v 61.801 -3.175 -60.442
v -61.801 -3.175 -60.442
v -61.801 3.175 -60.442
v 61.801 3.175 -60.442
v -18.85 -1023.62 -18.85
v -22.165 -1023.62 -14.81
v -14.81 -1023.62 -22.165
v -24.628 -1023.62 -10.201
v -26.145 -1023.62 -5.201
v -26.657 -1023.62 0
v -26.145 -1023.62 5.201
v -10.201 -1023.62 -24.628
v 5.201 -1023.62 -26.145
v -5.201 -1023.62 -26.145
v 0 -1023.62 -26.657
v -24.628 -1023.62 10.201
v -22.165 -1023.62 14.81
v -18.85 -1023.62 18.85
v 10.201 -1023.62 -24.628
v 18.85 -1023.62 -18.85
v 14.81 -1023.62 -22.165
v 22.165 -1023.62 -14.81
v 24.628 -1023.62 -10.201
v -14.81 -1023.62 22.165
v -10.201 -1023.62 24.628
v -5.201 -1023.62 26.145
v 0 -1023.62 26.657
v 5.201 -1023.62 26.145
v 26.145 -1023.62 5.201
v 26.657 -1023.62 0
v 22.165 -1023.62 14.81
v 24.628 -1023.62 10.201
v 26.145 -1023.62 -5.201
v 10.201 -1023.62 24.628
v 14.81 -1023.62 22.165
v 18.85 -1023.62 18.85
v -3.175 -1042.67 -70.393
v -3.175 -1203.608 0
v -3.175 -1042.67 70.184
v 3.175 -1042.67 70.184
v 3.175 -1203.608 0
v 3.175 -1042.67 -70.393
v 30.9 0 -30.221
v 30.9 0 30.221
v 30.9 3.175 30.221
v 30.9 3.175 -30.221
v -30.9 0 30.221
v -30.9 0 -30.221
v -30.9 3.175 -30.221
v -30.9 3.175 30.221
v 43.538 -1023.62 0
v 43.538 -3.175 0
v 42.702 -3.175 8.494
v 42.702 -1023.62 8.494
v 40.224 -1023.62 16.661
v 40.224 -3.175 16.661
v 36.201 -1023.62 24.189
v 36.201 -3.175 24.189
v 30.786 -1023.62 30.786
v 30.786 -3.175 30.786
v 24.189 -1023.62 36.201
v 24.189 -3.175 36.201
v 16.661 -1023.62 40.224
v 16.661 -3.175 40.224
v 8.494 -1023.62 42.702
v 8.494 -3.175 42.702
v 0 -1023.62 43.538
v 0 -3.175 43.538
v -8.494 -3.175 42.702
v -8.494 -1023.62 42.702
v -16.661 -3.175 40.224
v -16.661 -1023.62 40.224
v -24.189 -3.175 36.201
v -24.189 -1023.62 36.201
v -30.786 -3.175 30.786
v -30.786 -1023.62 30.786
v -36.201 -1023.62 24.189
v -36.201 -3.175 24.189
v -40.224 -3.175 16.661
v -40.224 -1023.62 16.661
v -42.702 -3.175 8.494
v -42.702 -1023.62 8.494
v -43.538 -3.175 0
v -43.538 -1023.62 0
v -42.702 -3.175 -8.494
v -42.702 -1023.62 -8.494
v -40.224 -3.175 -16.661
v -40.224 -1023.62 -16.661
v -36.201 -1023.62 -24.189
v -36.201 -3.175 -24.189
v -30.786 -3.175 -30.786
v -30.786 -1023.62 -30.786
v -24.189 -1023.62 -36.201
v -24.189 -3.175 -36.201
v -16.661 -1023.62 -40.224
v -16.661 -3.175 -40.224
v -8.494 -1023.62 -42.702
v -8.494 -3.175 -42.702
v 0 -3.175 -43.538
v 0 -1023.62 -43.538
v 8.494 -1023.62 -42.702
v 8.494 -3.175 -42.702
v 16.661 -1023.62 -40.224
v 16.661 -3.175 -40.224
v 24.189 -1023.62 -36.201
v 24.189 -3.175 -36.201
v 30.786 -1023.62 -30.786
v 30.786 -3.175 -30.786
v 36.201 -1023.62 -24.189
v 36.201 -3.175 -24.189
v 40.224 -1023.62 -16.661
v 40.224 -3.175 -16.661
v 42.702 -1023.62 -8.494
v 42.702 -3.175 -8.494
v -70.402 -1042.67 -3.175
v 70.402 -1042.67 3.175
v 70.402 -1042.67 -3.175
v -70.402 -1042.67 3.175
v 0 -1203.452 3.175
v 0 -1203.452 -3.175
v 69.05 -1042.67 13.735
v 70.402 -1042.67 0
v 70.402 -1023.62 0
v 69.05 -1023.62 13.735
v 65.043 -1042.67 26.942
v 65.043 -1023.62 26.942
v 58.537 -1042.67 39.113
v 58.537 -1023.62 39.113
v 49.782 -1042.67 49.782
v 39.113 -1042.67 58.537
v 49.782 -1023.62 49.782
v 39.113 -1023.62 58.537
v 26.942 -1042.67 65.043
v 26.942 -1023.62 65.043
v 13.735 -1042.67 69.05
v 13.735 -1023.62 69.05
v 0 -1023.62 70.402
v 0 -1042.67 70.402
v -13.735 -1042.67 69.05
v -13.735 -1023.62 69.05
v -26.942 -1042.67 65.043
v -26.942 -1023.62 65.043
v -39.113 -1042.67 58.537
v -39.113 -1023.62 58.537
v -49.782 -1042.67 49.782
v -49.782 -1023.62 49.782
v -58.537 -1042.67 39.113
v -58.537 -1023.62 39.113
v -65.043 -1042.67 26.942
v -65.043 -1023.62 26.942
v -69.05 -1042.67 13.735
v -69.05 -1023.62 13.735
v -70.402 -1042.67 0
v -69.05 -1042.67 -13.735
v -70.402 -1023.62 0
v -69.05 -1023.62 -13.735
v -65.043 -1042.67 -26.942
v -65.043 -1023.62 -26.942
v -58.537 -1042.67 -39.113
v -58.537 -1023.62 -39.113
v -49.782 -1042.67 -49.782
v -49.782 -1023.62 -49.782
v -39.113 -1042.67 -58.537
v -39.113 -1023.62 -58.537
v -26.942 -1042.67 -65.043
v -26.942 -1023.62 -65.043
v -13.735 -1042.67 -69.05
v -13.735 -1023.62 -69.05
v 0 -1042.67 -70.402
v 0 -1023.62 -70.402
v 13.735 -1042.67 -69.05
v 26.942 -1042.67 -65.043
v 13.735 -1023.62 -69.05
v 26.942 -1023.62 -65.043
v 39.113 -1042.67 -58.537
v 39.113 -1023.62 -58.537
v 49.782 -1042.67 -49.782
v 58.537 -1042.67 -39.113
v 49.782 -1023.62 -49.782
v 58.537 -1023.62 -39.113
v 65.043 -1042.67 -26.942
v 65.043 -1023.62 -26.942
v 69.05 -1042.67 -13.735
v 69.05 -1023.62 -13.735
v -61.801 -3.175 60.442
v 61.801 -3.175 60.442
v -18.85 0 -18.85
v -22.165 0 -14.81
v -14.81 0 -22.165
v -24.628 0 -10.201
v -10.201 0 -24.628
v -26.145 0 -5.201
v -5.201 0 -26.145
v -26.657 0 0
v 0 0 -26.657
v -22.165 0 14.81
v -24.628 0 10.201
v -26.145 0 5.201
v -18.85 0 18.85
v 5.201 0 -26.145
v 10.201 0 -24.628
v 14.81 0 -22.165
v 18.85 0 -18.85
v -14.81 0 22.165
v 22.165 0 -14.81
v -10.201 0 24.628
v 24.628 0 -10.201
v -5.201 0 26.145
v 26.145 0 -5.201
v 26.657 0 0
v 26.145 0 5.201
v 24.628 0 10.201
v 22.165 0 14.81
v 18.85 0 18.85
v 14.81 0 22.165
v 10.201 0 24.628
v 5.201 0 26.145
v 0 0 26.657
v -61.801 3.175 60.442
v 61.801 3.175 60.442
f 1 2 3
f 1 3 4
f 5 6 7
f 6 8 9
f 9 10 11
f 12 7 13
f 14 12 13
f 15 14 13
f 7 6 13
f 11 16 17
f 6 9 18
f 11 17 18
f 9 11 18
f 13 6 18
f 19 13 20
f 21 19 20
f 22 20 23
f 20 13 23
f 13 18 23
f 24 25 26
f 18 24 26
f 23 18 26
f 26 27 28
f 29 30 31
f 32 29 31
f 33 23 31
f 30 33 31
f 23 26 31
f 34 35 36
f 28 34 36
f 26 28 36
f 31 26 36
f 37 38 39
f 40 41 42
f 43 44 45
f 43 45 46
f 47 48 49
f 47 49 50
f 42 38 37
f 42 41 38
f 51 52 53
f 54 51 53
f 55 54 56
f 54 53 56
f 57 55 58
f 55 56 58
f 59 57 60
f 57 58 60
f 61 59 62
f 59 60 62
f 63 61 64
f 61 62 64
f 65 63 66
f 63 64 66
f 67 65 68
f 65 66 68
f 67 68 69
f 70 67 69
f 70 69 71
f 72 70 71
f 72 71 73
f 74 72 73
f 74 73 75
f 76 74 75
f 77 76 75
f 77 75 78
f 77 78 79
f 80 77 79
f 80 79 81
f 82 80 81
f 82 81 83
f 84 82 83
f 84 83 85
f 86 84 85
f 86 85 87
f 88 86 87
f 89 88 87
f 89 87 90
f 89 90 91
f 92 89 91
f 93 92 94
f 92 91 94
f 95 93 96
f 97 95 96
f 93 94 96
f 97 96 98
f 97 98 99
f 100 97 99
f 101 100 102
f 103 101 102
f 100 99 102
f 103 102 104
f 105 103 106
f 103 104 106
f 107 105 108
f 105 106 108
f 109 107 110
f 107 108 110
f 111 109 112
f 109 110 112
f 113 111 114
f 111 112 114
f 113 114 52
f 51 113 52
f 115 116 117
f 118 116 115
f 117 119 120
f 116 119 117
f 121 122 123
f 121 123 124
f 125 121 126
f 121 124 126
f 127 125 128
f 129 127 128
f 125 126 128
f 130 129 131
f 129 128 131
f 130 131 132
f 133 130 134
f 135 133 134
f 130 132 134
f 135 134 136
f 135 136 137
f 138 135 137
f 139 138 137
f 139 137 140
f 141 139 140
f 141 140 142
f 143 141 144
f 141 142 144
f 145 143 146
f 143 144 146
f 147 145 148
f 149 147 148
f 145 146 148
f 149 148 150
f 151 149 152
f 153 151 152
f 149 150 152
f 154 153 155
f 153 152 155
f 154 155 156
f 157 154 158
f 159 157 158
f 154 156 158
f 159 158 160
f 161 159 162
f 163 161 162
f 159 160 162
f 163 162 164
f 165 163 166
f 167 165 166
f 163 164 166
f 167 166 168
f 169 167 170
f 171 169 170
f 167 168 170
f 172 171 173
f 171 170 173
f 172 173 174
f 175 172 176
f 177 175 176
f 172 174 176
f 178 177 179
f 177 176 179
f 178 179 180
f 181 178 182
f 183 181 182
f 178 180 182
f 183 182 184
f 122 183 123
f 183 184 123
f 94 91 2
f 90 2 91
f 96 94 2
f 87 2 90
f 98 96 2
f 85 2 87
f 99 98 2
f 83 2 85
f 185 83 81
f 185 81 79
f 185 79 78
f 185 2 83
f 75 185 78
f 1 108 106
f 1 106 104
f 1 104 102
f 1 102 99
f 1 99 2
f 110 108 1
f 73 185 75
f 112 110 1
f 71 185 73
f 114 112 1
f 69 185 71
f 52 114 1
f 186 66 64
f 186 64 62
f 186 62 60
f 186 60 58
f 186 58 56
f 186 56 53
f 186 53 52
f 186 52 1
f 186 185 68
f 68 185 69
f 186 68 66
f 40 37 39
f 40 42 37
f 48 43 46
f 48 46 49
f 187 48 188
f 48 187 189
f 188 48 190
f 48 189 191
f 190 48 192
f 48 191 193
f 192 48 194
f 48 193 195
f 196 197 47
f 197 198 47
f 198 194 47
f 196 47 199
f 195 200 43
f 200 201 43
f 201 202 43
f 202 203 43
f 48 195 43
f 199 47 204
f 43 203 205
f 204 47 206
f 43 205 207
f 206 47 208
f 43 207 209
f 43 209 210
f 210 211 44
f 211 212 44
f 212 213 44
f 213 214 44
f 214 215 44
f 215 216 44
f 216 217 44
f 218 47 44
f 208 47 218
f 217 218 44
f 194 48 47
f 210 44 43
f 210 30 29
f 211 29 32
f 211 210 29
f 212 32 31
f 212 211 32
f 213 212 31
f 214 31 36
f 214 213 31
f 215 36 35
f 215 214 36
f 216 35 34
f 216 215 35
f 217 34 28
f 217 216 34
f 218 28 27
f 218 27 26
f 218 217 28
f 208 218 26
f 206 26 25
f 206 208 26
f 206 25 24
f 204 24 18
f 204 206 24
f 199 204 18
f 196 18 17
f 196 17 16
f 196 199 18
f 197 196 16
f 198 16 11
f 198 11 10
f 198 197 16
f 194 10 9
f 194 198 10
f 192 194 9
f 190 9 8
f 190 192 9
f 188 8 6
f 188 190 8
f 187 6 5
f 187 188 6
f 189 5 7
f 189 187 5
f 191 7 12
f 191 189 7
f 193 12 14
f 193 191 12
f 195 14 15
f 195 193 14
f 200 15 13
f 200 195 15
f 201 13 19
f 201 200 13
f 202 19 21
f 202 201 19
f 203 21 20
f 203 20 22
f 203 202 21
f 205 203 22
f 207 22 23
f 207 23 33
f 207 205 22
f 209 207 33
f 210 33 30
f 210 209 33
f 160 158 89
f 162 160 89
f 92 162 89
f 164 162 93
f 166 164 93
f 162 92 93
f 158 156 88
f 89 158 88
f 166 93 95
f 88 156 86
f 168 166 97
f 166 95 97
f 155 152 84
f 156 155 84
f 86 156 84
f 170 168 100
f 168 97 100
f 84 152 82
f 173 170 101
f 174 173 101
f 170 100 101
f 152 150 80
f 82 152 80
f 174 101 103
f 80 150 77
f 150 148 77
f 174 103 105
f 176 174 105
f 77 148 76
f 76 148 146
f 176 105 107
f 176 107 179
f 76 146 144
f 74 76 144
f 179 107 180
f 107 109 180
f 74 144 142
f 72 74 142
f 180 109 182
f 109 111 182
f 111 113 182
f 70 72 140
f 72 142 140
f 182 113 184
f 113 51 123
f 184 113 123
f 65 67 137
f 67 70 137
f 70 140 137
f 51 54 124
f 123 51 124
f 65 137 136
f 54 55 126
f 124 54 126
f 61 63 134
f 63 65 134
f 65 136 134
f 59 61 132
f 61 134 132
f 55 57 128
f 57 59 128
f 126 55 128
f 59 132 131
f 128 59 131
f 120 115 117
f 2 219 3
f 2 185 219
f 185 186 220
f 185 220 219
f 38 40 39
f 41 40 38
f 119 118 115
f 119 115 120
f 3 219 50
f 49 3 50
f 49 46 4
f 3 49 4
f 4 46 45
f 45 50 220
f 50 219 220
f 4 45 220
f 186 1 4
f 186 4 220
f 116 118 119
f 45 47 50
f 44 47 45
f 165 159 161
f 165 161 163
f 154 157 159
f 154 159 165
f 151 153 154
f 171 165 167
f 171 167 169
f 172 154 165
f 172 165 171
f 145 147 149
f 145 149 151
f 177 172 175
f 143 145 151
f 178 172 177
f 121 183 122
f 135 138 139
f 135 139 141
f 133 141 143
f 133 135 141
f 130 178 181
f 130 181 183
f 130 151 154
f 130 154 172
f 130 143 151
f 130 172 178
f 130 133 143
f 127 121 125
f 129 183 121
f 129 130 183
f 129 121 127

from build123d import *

# Parameters (mm, degrees)
F0_R      = 43.538166
F0_R_2    = 26.657293
F1_DEPTH  = 1023.62
F3_R      = 70.40233
F4_DEPTH  = 19.05
F7_DEPTH  = 3.175
F8_DEPTH  = 3.175
F10_DEPTH = 3.175


with BuildPart() as f1:
    # F0 (on Front) → F1 (new body)
    with BuildSketch(Plane.XZ):
        Circle(F0_R)
        Circle(F0_R_2, mode=Mode.SUBTRACT)
    extrude(amount=F1_DEPTH)

    # F3 (on offset) → F4 (join)
    with BuildSketch(Plane.XZ.offset(1023.62)):
        Circle(F3_R)
    extrude(amount=F4_DEPTH)

    # F9 (on Front) → F10 (join, symmetric)
    with BuildSketch(Plane.XZ):
        Polygon((-30.900305, 0), (-30.900305, 30.220892), (0, 30.220892), (0, 60.441785), (-61.80061, 60.441785), (-61.80061, 0), align=None)
        Polygon((-30.900305, -30.220892), (-30.900305, 0), (-61.80061, 0), (-61.80061, -60.441785), (0, -60.441785), (0, -30.220892), align=None)
        Polygon((61.80061, 0), (30.900305, 0), (30.900305, -30.220892), (0, -30.220892), (0, -60.441785), (61.80061, -60.441785), align=None)
        Polygon((0, 60.441785), (0, 30.220892), (30.900305, 30.220892), (30.900305, 0), (61.80061, 0), (61.80061, 60.441785), align=None)
    extrude(amount=F10_DEPTH, both=True)


with BuildPart() as f7:
    # F6 (on Top) → F7 (new body, symmetric)
    with BuildSketch(Plane.XY):
        Polygon((70.401758, -1042.670131), (-70.401974, -1042.670131), (0, -1203.451633), align=None)
    extrude(amount=F7_DEPTH, both=True)


with BuildPart() as f8:
    # F5 (on Right) → F8 (new body, symmetric)
    with BuildSketch(Plane.YZ):
        Polygon((-1042.67, -70.393234), (-1042.67, 0), (-1203.608274, 0), align=None)
        Polygon((-1203.608274, 0), (-1042.67, 0), (-1042.67, 70.183769), align=None)
    extrude(amount=F8_DEPTH, both=True)


solid = Compound([f1.part, f7.part, f8.part])
